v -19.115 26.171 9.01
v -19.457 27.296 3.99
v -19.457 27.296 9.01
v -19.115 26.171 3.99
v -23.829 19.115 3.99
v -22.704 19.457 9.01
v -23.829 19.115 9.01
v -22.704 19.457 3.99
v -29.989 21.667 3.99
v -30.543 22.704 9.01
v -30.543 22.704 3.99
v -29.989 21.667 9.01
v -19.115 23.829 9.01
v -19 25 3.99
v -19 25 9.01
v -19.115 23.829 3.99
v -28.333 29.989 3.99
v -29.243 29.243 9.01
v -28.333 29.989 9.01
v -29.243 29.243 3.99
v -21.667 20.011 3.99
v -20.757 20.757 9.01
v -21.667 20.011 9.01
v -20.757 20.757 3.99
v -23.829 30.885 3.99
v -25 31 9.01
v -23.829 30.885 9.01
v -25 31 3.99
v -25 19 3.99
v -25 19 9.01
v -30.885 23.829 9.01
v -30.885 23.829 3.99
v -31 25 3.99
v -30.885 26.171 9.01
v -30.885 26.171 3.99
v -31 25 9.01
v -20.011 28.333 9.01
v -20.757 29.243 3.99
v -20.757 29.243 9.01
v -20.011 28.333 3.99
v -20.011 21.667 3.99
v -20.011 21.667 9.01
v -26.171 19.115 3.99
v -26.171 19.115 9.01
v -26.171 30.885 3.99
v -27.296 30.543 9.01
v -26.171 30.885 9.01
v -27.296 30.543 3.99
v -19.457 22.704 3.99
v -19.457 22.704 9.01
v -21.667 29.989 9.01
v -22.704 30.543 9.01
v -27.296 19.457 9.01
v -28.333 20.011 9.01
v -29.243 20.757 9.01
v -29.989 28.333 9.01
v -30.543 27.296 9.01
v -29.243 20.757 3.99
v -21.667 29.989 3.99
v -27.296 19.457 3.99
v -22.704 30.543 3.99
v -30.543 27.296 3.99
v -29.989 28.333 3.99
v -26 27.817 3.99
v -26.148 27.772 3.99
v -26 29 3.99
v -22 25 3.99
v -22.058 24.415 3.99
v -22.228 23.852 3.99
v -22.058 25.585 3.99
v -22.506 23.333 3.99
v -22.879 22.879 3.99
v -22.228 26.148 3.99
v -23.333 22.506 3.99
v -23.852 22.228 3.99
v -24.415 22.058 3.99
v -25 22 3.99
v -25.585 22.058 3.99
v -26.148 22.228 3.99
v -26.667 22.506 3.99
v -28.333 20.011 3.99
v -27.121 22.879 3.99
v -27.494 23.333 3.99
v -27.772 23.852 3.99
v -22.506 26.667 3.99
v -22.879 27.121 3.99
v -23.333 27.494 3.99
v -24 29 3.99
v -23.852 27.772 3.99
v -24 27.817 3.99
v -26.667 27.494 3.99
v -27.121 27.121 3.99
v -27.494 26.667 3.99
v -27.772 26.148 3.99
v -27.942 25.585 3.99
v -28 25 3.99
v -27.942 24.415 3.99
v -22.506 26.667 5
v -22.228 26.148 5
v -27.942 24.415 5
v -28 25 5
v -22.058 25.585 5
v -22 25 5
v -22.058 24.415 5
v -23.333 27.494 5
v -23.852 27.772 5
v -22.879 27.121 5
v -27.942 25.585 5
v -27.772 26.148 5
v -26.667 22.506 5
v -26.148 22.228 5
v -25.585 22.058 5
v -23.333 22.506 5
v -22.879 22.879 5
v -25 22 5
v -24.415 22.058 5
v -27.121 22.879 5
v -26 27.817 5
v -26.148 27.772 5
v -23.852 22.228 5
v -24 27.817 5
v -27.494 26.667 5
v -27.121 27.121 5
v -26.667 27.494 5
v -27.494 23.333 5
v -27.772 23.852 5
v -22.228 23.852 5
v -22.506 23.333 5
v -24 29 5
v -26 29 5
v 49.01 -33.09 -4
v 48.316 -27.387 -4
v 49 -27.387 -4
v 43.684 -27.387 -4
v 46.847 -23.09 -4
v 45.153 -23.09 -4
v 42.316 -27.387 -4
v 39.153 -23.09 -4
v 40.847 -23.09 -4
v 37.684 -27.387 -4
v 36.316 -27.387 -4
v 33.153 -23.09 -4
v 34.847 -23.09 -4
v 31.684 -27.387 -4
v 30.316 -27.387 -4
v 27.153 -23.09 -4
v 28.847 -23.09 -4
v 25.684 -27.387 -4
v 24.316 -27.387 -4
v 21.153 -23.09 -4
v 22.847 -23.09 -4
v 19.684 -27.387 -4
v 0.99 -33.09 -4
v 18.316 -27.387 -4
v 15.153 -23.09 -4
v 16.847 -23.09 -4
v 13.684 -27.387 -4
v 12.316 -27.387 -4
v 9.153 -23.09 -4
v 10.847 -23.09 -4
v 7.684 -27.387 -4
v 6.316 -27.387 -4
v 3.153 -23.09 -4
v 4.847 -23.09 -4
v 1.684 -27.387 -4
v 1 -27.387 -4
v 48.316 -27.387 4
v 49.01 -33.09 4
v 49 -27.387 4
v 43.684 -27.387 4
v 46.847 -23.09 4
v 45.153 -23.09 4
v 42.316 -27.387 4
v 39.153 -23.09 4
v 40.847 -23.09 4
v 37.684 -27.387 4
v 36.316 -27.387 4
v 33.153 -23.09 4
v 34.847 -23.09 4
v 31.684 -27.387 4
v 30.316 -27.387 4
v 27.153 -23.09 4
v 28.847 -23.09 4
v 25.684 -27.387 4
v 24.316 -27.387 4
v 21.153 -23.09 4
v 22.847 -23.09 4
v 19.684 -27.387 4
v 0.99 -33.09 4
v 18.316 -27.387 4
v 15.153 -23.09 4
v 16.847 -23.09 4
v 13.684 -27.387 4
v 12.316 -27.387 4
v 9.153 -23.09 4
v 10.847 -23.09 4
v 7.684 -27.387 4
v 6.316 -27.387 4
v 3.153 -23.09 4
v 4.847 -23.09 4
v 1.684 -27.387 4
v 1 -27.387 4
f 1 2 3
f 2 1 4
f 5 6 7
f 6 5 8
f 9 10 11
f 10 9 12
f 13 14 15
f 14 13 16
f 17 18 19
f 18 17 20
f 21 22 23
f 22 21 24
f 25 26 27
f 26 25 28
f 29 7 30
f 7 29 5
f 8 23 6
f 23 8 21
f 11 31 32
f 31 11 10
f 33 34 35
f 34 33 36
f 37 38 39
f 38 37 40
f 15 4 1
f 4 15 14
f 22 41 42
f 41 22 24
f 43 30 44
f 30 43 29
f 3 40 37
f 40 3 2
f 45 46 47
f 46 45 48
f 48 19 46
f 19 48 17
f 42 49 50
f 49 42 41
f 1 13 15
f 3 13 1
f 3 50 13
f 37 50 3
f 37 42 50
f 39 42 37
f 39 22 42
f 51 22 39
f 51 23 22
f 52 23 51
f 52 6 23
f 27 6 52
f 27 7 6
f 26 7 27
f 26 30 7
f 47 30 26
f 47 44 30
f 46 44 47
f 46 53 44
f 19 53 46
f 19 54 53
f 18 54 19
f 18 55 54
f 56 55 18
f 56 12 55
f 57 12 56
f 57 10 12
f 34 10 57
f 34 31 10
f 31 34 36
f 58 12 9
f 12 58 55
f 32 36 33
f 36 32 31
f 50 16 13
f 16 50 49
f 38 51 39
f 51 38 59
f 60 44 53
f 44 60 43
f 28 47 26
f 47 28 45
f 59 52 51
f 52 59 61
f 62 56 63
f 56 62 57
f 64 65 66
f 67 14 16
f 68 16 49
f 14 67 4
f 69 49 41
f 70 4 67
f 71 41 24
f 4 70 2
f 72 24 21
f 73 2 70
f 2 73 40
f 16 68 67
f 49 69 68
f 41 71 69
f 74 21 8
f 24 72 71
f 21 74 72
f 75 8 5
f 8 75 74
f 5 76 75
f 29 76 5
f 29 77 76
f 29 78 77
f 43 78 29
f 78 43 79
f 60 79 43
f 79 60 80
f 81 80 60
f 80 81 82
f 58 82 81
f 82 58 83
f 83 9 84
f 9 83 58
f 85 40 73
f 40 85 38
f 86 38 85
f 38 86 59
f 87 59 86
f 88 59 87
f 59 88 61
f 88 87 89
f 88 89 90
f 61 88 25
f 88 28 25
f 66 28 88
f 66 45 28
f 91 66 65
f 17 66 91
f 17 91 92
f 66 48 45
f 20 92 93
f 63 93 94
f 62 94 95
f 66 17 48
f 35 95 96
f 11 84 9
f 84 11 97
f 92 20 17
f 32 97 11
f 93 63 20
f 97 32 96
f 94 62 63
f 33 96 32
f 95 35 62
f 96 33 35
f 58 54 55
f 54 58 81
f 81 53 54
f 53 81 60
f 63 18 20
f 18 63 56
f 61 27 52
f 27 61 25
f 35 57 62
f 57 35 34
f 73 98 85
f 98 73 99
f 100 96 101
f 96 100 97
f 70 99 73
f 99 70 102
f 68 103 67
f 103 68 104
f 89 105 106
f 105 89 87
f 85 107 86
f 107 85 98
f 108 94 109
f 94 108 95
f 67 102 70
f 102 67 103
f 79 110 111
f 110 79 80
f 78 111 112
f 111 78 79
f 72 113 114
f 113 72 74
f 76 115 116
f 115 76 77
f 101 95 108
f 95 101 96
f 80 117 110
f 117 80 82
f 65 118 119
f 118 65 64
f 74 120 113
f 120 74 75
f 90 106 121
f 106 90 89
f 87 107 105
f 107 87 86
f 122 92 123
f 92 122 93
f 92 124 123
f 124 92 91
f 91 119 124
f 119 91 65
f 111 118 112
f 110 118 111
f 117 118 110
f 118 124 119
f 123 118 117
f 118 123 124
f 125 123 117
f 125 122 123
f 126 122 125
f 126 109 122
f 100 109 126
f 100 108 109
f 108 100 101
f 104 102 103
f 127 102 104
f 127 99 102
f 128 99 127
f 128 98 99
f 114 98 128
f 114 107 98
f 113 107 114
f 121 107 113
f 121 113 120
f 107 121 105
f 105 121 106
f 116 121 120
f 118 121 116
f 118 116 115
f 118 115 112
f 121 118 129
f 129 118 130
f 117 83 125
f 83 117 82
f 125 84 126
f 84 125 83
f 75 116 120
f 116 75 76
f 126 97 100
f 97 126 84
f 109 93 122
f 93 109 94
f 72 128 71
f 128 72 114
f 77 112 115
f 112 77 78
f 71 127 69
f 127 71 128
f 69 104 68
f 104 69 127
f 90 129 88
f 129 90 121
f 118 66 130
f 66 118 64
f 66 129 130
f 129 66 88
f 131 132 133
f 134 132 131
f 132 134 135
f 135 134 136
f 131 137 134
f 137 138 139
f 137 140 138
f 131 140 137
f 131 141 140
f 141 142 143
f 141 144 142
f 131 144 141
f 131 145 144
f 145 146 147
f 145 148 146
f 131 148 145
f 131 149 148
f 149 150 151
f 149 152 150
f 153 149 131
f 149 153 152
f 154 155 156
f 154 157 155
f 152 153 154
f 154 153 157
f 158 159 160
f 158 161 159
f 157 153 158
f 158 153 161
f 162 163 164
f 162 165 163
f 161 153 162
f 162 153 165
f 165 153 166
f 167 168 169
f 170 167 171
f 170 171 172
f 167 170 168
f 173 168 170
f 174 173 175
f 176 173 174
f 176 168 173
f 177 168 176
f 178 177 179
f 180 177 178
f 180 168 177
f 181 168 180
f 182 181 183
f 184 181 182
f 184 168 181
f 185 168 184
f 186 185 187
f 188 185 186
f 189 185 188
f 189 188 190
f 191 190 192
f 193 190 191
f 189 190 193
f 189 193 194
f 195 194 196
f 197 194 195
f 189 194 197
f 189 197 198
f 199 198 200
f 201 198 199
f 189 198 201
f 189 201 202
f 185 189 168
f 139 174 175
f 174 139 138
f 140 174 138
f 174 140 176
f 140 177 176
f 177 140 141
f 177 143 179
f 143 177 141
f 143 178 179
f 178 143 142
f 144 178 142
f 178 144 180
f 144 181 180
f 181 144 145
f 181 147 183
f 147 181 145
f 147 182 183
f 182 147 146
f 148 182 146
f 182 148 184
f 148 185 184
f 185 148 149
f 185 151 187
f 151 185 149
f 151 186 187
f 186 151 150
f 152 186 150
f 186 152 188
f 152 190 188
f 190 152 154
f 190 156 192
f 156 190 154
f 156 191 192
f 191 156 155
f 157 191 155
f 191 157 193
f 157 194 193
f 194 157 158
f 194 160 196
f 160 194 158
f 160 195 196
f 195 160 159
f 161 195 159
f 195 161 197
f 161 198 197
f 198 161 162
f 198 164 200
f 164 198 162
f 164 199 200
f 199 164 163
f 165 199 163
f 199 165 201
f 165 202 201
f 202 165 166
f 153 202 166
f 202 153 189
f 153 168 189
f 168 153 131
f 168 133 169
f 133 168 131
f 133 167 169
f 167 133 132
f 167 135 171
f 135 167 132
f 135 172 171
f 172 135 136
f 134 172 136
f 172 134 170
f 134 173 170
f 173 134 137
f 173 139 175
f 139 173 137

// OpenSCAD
// file: GEOL/transforms.scad
// GEOL (Geometric Engine Optimized Library) - Transforms Module
// Highly optimized, library-free transformation shortcuts and distribution patterns.
// Created: 2026-05-18

// 1. Translation shortcut
module move(x=0, y=0, z=0) {
    translate([x, y, z]) children();
}

// 2. Rotation shortcuts
module xrot(a=0) {
    rotate([a, 0, 0]) children();
}

module yrot(a=0) {
    rotate([0, a, 0]) children();
}

module zrot(a=0) {
    rotate([0, 0, a]) children();
}

// 3. Mirroring helpers (retains original and adds mirrored child)
module mirror_x() {
    children();
    mirror([1, 0, 0]) children();
}

module mirror_y() {
    children();
    mirror([0, 1, 0]) children();
}

module mirror_z() {
    children();
    mirror([0, 0, 1]) children();
}

// 4. Grid Distribution Grid Spread
module grid_spread(spacing_x=20, spacing_y=20, count_x=2, count_y=2) {
    start_x = -((count_x - 1) * spacing_x) / 2;
    start_y = -((count_y - 1) * spacing_y) / 2;
    
    for (i = [0 : count_x - 1]) {
        for (j = [0 : count_y - 1]) {
            translate([start_x + i * spacing_x, start_y + j * spacing_y, 0]) {
                children();
            }
        }
    }
}

// 5. Radial Distribution
module radial_spread(r=10, count=6) {
    for (i = [0 : count - 1]) {
        angle = i * (360 / count);
        rotate([0, 0, angle]) {
            translate([r, 0, 0]) {
                children();
            }
        }
    }
}
// main file
// GEOL (Geometric Engine Optimized Library) - Involute Gears Showcase
// Demonstrates high-performance native spur, helical, beveled gears and racks.
// Created: 2026-05-18

use <GEOL/transforms.scad>
use <GEOL/involute_gears.scad>

$fn = 32;

// ==========================================
// Test 1: Spur Gear with Keyway & Hub
// ==========================================
echo("--- STARTING TEST 1: Spur Gear with Keyway & Hub ---");
translate([-25, 25, 0]) {
    color("crimson") {
        gear(
            mm_per_tooth    = 6,
            number_of_teeth = 15,
            thickness       = 8,
            hole_diameter   = 6,
            keyway_w        = 2,
            keyway_h        = 4,
            hub_d           = 12,
            hub_h           = 5,
            pressure_angle  = 20
        );
    }
}


// ==========================================
// Test 2: Helical Gear
// ==========================================
echo("--- STARTING TEST 2: Helical Gear ---");
translate([25, 25, 0]) {
    color("dodgerblue") {
        helical_gear(
            mm_per_tooth    = 6,
            number_of_teeth = 15,
            thickness       = 12,
            twist           = 45,
            hole_diameter   = 6,
            pressure_angle  = 20
        );
    }
}


// ==========================================
// Test 3: Bevel Gear
// ==========================================
echo("--- STARTING TEST 3: Bevel Gear ---");
translate([-25, -25, 0]) {
    color("gold") {
        bevel_gear(
            mm_per_tooth    = 6,
            number_of_teeth = 15,
            thickness       = 8,
            bevel_angle     = 30,
            hole_diameter   = 6,
            pressure_angle  = 20
        );
    }
}


// ==========================================
// Test 4: Gear Rack
// ==========================================
echo("--- STARTING TEST 4: Gear Rack ---");
translate([25, -25, 0]) {
    color("green") {
        gear_rack(
            mm_per_tooth    = 6,
            number_of_teeth = 8,
            thickness       = 8,
            height          = 10,
            pressure_angle  = 20
        );
    }
}
